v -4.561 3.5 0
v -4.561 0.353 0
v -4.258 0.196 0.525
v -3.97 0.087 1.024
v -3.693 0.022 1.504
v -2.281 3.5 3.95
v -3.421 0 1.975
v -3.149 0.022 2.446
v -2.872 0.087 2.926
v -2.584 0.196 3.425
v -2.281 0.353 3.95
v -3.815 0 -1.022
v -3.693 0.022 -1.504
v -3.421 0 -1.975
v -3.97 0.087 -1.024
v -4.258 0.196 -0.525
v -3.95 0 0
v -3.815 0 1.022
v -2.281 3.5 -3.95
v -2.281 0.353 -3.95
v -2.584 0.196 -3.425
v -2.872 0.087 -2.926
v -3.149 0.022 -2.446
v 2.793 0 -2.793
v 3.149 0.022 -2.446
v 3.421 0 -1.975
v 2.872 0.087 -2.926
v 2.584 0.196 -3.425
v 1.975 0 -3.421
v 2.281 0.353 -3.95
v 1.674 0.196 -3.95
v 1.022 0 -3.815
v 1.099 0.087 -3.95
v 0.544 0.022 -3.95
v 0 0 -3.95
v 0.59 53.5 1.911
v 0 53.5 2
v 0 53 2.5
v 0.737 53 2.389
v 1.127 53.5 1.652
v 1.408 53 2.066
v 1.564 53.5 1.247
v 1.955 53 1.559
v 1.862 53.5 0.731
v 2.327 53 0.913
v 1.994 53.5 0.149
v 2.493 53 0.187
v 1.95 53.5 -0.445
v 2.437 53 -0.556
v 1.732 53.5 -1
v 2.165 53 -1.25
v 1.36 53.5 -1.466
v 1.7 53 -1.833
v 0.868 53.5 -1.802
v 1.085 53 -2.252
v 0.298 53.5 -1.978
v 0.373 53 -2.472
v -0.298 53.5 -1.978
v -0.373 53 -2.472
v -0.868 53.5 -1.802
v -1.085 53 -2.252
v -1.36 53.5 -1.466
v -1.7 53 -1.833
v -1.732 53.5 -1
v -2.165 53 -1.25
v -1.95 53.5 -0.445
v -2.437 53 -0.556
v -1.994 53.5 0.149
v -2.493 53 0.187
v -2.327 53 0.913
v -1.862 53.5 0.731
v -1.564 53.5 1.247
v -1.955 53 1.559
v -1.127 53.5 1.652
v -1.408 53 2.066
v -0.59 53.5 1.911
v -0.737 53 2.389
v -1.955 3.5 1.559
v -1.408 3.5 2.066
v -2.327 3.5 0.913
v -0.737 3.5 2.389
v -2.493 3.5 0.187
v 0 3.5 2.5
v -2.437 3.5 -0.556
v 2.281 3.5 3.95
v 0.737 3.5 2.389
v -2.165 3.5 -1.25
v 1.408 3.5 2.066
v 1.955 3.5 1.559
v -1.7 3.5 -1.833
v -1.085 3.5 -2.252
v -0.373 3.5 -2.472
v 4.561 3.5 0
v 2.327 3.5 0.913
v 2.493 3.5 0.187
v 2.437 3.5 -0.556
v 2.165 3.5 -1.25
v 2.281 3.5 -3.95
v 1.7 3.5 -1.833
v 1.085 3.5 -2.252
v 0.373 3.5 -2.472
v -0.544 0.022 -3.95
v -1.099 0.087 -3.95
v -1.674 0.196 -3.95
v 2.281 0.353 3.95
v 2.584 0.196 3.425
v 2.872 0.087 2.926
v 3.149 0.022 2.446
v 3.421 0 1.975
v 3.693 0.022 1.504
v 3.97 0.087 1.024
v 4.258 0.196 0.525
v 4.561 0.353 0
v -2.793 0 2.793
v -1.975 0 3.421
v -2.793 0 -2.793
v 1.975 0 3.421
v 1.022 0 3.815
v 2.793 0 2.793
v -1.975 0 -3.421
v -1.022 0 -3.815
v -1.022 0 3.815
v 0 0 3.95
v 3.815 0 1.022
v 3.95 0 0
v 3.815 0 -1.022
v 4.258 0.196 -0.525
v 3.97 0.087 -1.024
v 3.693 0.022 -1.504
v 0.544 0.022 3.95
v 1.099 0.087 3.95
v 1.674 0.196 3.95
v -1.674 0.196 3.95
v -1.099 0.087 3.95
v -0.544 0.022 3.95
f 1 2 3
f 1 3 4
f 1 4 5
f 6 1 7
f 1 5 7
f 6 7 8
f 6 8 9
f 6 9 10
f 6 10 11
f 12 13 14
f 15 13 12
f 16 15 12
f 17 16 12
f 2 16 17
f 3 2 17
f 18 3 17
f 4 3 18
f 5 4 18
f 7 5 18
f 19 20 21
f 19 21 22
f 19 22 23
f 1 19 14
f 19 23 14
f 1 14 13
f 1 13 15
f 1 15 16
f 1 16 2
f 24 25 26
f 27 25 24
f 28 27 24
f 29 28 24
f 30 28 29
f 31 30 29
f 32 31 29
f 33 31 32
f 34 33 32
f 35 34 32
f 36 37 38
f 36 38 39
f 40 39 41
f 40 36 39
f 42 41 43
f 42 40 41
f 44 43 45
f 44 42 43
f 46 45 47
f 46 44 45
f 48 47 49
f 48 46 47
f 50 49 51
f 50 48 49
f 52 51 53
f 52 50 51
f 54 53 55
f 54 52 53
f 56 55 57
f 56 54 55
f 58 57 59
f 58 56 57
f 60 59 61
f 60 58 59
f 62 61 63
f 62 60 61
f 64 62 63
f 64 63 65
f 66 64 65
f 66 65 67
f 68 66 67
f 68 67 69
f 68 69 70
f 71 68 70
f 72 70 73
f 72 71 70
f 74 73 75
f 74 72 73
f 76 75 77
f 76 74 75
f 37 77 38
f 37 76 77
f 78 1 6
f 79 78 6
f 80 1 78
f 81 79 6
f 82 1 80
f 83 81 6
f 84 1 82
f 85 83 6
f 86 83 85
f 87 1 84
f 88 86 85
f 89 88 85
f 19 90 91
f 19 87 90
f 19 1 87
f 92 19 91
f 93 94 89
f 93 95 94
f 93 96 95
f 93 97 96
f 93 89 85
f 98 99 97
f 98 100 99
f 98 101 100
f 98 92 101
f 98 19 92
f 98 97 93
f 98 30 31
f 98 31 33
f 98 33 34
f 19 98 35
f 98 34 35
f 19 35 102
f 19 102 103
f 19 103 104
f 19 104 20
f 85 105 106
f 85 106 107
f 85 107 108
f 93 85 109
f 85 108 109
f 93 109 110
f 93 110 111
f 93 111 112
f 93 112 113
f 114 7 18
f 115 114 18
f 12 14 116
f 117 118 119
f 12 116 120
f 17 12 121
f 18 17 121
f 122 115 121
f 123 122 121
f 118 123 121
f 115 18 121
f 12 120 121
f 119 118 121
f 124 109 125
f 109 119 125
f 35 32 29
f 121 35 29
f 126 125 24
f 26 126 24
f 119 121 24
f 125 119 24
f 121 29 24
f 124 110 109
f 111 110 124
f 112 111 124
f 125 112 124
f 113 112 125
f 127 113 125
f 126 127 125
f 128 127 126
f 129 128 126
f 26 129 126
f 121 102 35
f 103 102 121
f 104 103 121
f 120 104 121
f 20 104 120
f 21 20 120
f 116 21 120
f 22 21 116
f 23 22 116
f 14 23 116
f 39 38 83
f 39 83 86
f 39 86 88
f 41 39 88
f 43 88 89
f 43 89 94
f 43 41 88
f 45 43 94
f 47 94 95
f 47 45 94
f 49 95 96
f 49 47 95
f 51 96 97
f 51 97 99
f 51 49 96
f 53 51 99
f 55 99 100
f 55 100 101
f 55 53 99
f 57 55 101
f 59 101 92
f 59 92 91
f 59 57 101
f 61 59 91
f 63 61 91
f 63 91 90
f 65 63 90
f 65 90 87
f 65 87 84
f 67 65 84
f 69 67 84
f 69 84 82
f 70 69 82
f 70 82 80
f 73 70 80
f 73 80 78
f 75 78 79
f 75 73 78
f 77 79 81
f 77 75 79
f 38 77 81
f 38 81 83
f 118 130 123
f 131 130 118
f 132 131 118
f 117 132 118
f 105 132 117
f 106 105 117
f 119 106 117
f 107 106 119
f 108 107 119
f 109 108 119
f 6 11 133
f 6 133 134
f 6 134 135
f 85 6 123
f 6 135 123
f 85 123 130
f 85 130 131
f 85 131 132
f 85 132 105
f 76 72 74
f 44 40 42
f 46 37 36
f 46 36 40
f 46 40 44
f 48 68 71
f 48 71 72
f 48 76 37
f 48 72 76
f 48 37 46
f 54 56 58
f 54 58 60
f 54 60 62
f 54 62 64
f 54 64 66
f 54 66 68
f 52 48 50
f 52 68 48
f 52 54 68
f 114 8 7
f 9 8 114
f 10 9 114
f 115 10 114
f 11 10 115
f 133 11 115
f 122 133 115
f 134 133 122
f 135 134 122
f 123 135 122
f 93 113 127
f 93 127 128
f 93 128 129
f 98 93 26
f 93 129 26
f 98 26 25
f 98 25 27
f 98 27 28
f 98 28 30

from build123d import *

# Parameters (mm, degrees)
BOSS_EXTRUDE1_DEPTH = 53.5
SKETCH2_OUTSIDE_W   = 22.09
SKETCH2_OUTSIDE_H   = 20.868
SKETCH2_OUTSIDE_R   = 2.5
CUT_EXTRUDE1_DEPTH  = 50
CHAMFER1_SIZE       = 0.5


with BuildPart() as part:
    # Sketch1 → Boss-Extrude1 (new body)
    with BuildSketch(Plane(origin=(0, 0, 0), x_dir=(1, 0, 0), z_dir=(0, 1, 0))):
        Polygon((4.561067127, 0), (2.280533563, 3.95), (-2.280533563, 3.95), (-4.561067127, 0), (-2.280533563, -3.95), (2.280533563, -3.95), align=None)
    extrude(amount=BOSS_EXTRUDE1_DEPTH)

    # Sketch2 outside → Cut-Extrude1 (cut)
    with BuildSketch(Plane(origin=(0, 53.5, 0), x_dir=(1, 0, 0), z_dir=(0, 1, 0))):
        Rectangle(SKETCH2_OUTSIDE_W, SKETCH2_OUTSIDE_H)
        with Locations(Location((0, 0, 0), (0, 0, 270))):
            Circle(SKETCH2_OUTSIDE_R, mode=Mode.SUBTRACT)
    extrude(amount=-CUT_EXTRUDE1_DEPTH, mode=Mode.SUBTRACT)

    # Sketch3 → Cut-Revolve1 (revolve, cut)
    with BuildSketch(Plane(origin=(0, 0, 0), x_dir=(0, 0, -1), z_dir=(1, 0, 0))):
        Polygon((3.95, 0), (5.249038106, 0.75), (5.249038106, -0.75), align=None)
    revolve(axis=Axis((0, 3.5, 0), (0, 1, 0)), mode=Mode.SUBTRACT)

    # Chamfer1
    chamfer1_edges = [part.edges().sort_by_distance(p)[0] for p in [
        (0, 53.5, -2.5),
    ]]
    chamfer(chamfer1_edges, length=CHAMFER1_SIZE)


solid = part.part
